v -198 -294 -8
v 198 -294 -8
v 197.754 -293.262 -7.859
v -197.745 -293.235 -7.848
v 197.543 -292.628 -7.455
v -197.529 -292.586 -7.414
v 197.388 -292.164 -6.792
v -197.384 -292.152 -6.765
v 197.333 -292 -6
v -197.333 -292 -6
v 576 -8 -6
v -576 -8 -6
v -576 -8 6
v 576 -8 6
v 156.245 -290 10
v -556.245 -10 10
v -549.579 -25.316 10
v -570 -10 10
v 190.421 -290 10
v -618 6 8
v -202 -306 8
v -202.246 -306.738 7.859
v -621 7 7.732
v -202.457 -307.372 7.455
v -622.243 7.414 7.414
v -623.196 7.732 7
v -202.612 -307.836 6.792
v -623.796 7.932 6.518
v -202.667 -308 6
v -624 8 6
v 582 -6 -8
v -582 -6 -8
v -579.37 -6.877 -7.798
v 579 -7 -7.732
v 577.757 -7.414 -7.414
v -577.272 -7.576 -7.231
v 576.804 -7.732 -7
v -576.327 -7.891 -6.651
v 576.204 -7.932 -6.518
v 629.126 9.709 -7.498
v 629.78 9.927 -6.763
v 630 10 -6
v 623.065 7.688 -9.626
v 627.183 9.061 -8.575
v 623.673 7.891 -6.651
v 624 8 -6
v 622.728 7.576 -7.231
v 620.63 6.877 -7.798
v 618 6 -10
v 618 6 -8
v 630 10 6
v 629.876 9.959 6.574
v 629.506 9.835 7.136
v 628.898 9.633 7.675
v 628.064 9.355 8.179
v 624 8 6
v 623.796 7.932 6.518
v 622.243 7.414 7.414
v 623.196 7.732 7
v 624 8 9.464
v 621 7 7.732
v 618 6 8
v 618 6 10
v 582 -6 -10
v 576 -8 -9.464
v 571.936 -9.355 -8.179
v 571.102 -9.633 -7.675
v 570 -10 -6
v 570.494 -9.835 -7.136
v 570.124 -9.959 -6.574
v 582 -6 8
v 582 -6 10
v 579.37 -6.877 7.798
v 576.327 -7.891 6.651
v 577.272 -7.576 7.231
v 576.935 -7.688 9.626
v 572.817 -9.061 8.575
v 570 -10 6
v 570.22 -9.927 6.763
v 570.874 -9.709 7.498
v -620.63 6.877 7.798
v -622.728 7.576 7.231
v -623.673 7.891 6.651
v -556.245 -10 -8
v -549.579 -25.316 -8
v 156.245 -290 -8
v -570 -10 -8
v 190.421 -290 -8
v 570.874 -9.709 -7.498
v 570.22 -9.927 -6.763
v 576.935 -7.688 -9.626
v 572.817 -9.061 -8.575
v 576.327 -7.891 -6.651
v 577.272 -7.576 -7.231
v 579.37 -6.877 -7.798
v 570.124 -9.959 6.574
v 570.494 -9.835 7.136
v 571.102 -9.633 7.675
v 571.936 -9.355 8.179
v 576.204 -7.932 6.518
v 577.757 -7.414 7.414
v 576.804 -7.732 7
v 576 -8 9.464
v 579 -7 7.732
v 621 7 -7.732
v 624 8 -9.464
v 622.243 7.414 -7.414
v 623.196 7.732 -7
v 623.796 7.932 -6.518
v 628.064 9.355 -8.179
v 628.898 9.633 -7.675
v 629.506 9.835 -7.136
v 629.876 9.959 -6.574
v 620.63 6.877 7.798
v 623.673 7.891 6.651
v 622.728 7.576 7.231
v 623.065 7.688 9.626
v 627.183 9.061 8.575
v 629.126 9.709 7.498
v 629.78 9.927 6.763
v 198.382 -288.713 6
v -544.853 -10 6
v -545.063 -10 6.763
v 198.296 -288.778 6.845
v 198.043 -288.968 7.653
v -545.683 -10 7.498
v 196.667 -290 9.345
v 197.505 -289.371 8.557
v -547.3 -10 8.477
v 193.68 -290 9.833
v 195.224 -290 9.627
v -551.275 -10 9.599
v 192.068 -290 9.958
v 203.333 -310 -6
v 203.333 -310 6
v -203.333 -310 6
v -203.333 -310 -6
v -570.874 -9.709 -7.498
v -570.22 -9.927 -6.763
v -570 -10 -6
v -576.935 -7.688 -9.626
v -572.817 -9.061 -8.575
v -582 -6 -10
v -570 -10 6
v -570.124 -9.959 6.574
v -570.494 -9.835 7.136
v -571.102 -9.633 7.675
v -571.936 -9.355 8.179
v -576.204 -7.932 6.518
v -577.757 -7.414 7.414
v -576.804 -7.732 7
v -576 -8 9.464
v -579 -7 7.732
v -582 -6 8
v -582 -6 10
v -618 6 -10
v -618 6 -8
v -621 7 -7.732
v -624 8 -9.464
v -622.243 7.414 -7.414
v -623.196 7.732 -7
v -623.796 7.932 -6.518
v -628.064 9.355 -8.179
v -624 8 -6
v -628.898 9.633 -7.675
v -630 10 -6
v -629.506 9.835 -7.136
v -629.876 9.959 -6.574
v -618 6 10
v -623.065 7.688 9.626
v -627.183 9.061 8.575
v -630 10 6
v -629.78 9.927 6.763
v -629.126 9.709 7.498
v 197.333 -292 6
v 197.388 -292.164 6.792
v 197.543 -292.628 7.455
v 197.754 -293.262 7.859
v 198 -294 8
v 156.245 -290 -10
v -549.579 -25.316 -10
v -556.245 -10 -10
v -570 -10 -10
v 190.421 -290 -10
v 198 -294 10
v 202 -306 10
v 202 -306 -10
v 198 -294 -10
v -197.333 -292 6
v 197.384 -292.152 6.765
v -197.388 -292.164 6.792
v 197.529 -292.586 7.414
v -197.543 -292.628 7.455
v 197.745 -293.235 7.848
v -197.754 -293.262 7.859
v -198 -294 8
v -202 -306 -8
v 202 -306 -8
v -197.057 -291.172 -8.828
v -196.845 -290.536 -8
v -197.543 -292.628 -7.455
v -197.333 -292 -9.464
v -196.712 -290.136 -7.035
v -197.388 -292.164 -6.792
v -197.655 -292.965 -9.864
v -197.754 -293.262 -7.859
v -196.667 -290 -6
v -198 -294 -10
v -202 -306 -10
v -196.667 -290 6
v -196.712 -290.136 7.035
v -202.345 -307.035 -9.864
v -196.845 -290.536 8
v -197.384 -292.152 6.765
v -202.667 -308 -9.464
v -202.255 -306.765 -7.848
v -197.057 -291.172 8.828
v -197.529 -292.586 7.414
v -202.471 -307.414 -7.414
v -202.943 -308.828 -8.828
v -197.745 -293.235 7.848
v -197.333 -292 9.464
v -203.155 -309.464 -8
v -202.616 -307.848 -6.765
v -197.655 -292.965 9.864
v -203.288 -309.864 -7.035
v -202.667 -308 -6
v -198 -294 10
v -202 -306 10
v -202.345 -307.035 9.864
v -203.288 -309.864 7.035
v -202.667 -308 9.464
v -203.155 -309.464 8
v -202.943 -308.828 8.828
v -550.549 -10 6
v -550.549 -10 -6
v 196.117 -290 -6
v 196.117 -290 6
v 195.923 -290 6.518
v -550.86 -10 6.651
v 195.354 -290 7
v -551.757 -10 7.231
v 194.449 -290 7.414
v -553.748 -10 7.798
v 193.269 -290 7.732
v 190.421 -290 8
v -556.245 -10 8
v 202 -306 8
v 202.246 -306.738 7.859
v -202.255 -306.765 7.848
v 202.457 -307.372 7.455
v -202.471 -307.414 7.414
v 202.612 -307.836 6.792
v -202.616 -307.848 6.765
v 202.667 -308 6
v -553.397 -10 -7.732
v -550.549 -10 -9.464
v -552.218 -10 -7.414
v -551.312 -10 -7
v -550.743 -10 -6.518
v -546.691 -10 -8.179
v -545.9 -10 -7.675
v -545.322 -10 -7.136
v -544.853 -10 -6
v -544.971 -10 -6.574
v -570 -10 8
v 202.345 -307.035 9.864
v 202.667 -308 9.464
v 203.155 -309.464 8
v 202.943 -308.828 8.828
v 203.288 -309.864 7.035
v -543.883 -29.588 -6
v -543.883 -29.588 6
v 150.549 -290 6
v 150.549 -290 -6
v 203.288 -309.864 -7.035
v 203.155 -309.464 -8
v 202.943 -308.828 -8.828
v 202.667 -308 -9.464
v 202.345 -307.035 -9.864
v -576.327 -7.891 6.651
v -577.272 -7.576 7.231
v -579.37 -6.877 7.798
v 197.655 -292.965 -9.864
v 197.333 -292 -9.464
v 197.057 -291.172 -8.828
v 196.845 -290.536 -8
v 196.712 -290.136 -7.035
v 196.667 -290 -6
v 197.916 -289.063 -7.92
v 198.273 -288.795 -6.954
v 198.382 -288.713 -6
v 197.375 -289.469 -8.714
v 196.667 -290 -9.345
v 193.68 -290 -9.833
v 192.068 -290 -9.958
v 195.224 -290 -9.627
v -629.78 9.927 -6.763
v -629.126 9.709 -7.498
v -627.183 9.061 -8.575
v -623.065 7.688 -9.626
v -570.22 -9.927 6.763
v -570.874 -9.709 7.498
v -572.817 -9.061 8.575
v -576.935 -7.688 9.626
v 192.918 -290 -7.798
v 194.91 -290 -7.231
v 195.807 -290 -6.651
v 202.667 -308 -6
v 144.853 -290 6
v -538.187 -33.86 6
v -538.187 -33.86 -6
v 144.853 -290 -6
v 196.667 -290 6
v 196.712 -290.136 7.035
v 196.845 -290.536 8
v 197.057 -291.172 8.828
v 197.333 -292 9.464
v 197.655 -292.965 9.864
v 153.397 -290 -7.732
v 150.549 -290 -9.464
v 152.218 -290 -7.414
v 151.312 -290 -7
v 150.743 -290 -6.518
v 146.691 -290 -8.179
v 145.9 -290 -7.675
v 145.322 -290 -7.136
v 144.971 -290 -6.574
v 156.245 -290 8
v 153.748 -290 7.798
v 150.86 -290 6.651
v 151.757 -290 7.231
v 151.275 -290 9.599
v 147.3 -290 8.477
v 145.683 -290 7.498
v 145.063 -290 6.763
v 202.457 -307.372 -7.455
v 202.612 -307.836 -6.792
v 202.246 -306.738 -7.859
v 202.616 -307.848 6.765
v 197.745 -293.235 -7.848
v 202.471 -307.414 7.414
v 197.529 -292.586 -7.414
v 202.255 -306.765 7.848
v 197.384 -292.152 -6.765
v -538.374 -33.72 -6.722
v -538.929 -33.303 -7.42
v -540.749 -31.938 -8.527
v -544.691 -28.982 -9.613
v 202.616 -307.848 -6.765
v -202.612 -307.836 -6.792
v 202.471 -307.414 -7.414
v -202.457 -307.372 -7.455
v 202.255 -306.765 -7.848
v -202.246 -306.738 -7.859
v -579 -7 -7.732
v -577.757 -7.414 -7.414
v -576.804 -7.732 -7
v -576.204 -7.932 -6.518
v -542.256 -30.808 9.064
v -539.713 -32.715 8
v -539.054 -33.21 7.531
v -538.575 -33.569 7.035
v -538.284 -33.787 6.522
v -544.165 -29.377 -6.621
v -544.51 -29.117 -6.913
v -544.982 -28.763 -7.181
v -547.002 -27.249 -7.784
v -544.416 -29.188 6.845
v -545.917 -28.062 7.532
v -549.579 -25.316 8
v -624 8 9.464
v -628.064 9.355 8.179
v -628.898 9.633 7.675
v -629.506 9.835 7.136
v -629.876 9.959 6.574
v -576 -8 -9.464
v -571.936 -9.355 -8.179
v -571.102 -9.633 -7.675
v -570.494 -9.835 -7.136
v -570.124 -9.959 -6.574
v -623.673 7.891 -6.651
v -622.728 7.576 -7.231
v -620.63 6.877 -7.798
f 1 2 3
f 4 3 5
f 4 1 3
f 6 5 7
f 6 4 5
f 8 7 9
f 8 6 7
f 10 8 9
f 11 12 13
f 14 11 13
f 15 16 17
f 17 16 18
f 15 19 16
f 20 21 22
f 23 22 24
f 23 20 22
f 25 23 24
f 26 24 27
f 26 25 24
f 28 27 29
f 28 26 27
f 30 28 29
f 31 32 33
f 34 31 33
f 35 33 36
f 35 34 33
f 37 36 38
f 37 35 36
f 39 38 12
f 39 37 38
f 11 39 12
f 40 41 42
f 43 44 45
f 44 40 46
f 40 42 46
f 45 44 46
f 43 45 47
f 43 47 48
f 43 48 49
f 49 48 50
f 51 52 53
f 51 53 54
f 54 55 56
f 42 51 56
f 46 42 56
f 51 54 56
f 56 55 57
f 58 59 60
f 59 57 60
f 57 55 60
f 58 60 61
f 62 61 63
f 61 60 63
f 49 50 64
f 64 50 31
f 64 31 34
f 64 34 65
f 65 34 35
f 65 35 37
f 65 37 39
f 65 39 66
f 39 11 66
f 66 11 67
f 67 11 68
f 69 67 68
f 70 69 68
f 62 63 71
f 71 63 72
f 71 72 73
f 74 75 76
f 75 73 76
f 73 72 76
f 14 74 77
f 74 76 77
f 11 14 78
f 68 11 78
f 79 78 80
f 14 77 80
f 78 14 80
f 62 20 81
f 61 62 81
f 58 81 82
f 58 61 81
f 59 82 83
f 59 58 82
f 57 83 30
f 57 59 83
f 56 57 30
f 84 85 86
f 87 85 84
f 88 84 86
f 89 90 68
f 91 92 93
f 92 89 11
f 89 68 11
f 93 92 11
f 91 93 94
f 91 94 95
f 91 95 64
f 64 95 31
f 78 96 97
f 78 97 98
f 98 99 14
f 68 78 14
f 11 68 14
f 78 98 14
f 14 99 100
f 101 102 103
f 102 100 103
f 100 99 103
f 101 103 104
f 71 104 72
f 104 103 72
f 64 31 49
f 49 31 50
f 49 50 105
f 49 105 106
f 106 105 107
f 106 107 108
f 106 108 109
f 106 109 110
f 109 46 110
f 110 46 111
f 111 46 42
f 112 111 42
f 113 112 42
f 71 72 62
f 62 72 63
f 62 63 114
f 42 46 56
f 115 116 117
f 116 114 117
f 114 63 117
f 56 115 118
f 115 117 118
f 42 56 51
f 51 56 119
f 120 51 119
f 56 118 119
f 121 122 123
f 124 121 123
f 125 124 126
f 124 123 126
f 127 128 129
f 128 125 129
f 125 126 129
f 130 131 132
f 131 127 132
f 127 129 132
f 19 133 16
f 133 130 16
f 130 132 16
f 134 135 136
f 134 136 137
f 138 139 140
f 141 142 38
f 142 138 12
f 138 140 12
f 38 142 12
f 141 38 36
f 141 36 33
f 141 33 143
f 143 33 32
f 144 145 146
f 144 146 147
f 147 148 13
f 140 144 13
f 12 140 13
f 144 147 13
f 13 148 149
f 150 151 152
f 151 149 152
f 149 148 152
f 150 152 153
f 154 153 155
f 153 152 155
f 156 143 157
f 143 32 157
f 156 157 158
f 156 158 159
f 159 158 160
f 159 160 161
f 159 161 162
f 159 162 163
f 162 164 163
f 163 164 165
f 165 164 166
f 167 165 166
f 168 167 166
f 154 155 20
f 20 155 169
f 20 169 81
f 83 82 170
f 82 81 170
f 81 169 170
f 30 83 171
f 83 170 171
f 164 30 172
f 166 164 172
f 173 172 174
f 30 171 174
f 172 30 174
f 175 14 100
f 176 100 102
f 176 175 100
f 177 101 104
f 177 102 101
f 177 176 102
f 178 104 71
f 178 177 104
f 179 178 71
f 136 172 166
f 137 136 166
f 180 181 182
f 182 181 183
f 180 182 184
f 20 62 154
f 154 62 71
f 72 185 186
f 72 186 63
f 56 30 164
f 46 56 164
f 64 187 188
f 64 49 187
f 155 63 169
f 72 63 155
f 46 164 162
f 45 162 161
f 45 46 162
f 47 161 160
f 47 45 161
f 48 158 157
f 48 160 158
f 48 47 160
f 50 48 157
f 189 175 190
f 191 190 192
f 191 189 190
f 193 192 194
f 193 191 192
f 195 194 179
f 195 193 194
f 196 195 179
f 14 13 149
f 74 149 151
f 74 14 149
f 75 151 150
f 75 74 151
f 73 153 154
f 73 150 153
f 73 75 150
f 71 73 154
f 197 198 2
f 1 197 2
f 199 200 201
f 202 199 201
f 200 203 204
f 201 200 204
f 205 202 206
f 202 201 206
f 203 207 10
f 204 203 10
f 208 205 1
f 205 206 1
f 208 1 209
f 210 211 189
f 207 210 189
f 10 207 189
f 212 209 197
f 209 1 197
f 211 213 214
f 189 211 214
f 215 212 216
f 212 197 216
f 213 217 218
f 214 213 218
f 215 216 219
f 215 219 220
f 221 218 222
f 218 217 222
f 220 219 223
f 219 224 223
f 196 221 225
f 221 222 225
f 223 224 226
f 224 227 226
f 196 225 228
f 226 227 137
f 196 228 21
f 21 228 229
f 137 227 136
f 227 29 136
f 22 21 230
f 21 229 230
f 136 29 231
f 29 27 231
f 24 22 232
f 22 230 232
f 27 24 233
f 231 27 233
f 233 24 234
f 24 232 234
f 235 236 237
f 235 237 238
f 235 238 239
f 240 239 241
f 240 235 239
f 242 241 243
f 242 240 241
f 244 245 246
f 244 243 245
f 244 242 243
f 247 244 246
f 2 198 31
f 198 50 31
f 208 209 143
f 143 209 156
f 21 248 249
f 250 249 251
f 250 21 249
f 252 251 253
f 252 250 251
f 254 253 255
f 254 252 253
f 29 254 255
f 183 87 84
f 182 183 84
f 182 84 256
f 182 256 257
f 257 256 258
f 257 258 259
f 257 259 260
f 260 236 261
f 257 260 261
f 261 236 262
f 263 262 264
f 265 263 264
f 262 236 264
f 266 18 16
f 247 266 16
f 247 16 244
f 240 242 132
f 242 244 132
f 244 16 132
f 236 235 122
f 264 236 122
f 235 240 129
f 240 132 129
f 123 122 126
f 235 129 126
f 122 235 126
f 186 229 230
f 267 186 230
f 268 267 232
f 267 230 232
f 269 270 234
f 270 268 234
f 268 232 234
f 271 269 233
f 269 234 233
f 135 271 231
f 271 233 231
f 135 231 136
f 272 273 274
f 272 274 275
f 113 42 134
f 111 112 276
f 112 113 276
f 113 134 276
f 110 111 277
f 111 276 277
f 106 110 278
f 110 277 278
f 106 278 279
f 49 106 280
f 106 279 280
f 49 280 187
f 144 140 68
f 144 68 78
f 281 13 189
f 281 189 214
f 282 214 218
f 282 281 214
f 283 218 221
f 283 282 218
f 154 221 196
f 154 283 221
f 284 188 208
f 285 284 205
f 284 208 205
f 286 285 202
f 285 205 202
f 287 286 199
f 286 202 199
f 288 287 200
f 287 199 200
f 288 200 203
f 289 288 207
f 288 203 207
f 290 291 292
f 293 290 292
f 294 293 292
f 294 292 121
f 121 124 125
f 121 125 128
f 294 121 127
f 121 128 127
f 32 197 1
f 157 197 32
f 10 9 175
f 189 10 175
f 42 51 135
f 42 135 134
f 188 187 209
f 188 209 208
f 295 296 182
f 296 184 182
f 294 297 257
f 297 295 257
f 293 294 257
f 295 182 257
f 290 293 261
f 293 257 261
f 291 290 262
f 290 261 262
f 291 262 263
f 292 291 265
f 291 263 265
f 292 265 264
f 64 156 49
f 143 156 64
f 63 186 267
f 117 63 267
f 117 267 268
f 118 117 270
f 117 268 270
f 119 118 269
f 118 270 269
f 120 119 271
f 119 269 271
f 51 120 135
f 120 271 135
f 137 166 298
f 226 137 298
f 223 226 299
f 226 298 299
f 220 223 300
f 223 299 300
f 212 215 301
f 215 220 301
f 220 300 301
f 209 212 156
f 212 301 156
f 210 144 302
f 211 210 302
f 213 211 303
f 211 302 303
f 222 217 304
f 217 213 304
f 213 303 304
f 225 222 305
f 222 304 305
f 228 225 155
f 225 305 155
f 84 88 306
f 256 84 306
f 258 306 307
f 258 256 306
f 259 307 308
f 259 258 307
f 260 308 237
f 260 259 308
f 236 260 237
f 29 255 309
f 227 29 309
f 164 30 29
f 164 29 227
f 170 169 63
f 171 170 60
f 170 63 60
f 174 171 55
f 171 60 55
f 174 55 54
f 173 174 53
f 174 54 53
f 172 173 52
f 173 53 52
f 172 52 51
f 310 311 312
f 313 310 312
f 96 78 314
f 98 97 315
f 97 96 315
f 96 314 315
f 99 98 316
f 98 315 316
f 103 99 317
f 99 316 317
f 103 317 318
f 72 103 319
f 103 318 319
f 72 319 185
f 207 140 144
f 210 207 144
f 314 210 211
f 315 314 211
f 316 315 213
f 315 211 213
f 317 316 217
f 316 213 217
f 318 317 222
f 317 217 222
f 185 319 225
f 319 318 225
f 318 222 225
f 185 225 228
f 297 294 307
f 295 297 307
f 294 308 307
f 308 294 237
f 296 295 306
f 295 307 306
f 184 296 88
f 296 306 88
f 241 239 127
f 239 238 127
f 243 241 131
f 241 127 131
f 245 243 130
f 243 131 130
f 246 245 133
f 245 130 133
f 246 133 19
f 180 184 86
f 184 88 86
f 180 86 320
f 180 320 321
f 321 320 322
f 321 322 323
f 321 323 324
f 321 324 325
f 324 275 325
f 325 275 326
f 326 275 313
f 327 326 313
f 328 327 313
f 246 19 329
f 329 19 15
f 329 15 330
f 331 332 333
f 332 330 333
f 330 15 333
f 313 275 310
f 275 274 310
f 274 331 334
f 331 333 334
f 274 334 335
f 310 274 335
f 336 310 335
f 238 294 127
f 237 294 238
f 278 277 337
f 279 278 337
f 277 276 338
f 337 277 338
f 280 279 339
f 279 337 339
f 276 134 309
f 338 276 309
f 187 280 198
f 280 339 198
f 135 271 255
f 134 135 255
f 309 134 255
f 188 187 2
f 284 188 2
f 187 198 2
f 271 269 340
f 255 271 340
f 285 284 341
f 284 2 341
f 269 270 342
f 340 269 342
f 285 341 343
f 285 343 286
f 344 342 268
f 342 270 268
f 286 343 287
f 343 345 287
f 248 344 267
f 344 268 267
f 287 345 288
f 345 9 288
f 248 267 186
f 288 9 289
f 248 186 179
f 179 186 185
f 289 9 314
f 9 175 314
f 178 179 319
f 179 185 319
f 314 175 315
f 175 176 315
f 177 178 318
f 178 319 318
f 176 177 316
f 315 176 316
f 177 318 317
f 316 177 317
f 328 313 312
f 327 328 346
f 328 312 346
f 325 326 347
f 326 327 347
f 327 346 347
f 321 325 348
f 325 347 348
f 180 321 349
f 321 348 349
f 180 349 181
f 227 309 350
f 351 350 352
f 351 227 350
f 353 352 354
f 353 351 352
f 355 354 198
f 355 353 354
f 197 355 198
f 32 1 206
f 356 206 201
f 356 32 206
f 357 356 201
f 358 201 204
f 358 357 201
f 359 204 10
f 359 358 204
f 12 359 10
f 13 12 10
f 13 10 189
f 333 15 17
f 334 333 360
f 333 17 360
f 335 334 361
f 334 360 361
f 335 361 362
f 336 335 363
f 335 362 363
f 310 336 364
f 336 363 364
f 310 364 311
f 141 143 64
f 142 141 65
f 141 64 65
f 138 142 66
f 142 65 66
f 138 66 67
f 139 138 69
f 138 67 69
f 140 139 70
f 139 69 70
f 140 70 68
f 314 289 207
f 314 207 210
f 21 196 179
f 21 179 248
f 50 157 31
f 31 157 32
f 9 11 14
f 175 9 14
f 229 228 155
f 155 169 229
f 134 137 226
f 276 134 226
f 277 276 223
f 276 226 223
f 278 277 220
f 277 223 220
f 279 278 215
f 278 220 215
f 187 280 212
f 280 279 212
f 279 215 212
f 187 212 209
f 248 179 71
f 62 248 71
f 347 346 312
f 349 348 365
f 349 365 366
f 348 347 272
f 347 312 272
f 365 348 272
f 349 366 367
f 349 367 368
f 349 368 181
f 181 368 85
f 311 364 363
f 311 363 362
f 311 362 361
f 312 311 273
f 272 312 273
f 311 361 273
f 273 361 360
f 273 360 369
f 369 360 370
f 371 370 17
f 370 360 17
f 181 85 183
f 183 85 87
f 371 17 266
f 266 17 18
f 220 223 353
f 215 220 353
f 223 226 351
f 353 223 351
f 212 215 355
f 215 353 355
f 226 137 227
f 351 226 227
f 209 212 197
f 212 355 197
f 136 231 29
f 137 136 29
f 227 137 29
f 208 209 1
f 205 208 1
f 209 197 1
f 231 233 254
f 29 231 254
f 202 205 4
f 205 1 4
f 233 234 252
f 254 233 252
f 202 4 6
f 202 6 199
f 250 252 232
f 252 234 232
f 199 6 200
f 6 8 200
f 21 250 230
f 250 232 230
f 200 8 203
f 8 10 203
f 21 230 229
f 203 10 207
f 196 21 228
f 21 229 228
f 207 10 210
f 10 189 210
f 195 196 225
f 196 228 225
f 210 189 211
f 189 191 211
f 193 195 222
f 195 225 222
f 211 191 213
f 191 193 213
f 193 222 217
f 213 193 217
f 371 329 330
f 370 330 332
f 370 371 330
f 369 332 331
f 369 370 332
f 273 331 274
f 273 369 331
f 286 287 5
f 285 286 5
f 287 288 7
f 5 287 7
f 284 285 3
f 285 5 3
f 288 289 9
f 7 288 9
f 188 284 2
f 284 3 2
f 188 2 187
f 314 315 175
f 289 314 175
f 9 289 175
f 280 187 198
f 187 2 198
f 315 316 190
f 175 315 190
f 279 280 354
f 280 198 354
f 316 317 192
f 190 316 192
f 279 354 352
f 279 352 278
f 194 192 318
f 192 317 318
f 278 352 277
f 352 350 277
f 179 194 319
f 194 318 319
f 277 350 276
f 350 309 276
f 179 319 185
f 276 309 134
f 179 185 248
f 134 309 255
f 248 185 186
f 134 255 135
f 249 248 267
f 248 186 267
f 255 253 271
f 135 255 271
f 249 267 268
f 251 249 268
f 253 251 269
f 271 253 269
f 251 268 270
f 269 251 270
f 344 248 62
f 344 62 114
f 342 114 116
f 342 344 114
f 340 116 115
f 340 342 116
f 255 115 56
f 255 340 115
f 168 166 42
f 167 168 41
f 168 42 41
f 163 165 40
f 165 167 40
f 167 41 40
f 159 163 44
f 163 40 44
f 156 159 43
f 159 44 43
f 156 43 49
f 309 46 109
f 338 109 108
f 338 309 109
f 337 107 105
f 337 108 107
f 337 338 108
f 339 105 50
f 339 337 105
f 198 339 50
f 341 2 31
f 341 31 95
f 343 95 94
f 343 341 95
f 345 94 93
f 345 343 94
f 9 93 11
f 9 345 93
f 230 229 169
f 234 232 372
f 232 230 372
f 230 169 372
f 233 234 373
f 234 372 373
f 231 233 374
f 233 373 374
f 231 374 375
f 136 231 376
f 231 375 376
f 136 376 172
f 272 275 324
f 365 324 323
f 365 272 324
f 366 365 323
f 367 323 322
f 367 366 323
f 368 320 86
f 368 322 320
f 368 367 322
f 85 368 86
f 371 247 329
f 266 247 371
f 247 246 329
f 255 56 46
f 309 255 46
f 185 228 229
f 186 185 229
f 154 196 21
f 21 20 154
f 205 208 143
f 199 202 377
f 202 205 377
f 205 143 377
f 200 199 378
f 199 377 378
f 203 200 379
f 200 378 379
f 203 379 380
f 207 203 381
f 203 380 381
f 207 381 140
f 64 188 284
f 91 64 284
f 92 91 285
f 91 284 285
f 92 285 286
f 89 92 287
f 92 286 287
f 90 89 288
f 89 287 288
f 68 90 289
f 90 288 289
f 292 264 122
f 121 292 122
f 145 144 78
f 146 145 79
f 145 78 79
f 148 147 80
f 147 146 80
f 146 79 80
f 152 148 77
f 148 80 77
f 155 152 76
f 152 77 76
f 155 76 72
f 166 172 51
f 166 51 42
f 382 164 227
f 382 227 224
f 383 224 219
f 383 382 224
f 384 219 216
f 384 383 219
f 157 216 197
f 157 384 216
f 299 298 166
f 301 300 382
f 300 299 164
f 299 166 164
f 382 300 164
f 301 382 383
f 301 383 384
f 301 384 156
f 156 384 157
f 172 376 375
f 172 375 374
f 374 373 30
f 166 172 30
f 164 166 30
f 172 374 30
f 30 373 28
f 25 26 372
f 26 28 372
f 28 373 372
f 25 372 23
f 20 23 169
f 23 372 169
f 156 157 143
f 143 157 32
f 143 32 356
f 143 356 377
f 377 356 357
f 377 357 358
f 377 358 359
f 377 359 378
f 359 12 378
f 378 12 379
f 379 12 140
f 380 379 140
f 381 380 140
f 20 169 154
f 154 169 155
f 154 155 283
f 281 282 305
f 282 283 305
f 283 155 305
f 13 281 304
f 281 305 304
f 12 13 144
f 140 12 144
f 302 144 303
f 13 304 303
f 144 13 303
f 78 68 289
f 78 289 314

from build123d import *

# Parameters (mm, degrees)
SQUARE_TUBE_20_X_20_X_2_2_DEPTH      = 1243.426406871
SQUARE_TUBE_20_X_20_X_2_2_DEPTH_BACK = 43.426406871
SQUARE_TUBE_20_X_20_X_2_2_2_DEPTH    = 549.140452079
SQUARE_TUBE_20_X_20_X_2_2_3_DEPTH    = 411.428090416
SQUARE_TUBE_20_X_20_X_2_2_4_DEPTH    = 549.140452079
SQUARE_TUBE_20_X_20_X_2_1_DEPTH      = 854.400374532


with BuildPart() as part:
    # Sketch15 → Square tube 20 X 20 X 2(2) (new, two sides: drawn at the far end of the back side and taken through both)
    with BuildSketch(Plane(origin=(600, 0, 0), x_dir=(0, -1, 0), z_dir=(-1, 0, 0)).offset(-SQUARE_TUBE_20_X_20_X_2_2_DEPTH_BACK)):
        with BuildLine():
            Line((-6, -10), (6, -10))
            ThreePointArc((6, -10), (8.828427125, -8.828427125), (10, -6))
            Line((10, -6), (10, 6))
            ThreePointArc((10, 6), (8.828427125, 8.828427125), (6, 10))
            Line((6, 10), (-6, 10))
            ThreePointArc((-6, 10), (-8.828427125, 8.828427125), (-10, 6))
            Line((-10, 6), (-10, -6))
            ThreePointArc((-10, -6), (-8.828427125, -8.828427125), (-6, -10))
        make_face()
        with BuildLine():
            Line((-6, -8), (6, -8))
            ThreePointArc((6, -8), (7.414213562, -7.414213562), (8, -6))
            Line((8, -6), (8, 6))
            ThreePointArc((8, 6), (7.414213562, 7.414213562), (6, 8))
            Line((6, 8), (-6, 8))
            ThreePointArc((-6, 8), (-7.414213562, 7.414213562), (-8, 6))
            Line((-8, 6), (-8, -6))
            ThreePointArc((-8, -6), (-7.414213562, -7.414213562), (-6, -8))
        make_face(mode=Mode.SUBTRACT)
    extrude(amount=SQUARE_TUBE_20_X_20_X_2_2_DEPTH + SQUARE_TUBE_20_X_20_X_2_2_DEPTH_BACK)

    # Square tube 20 X 20 X 2(2) mitre 1
    split(bisect_by=Plane(origin=(600, 0, 0), x_dir=(-0.948683298, -0.316227766, 0), z_dir=(-0.316227766, 0.948683298, 0)), keep=Keep.TOP)

    # Square tube 20 X 20 X 2(2) mitre 2
    split(bisect_by=Plane(origin=(-600, 0, 0), x_dir=(-0.948683298, 0.316227766, 0), z_dir=(0.316227766, 0.948683298, 0)), keep=Keep.TOP)


with BuildPart() as body_2:
    # Sketch15 on segment 2 (carried to segment 2) → Square tube 20 X 20 X 2_2 2 (new body)
    with BuildSketch(Plane(origin=(-634.741125497, 26.055844123, 0), x_dir=(0.6, 0.8, 0), z_dir=(0.8, -0.6, 0))):
        with BuildLine():
            Line((-6, -10), (6, -10))
            ThreePointArc((6, -10), (8.828427125, -8.828427125), (10, -6))
            Line((10, -6), (10, 6))
            ThreePointArc((10, 6), (8.828427125, 8.828427125), (6, 10))
            Line((6, 10), (-6, 10))
            ThreePointArc((-6, 10), (-8.828427125, 8.828427125), (-10, 6))
            Line((-10, 6), (-10, -6))
            ThreePointArc((-10, -6), (-8.828427125, -8.828427125), (-6, -10))
        make_face()
        with BuildLine():
            Line((-6, -8), (6, -8))
            ThreePointArc((6, -8), (7.414213562, -7.414213562), (8, -6))
            Line((8, -6), (8, 6))
            ThreePointArc((8, 6), (7.414213562, 7.414213562), (6, 8))
            Line((6, 8), (-6, 8))
            ThreePointArc((-6, 8), (-7.414213562, 7.414213562), (-8, 6))
            Line((-8, 6), (-8, -6))
            ThreePointArc((-8, -6), (-7.414213562, -7.414213562), (-6, -8))
        make_face(mode=Mode.SUBTRACT)
    extrude(amount=SQUARE_TUBE_20_X_20_X_2_2_2_DEPTH)

    # Square tube 20 X 20 X 2_2 2 mitre 1
    split(bisect_by=Plane(origin=(-600, 0, 0), x_dir=(0.948683298, -0.316227766, 0), z_dir=(-0.316227766, -0.948683298, 0)), keep=Keep.TOP)

    # Square tube 20 X 20 X 2_2 2 mitre 2
    split(bisect_by=Plane(origin=(-200, -300, 0), x_dir=(-0.316227766, -0.948683298, 0), z_dir=(-0.948683298, 0.316227766, 0)), keep=Keep.TOP)


with BuildPart() as body_3:
    # Sketch15 on segment 3 (carried to segment 3) → Square tube 20 X 20 X 2_2 3 (new body)
    with BuildSketch(Plane(origin=(-205.714045208, -300, 0), x_dir=(0, 1, 0), z_dir=(1, 0, 0))):
        with BuildLine():
            Line((-6, -10), (6, -10))
            ThreePointArc((6, -10), (8.828427125, -8.828427125), (10, -6))
            Line((10, -6), (10, 6))
            ThreePointArc((10, 6), (8.828427125, 8.828427125), (6, 10))
            Line((6, 10), (-6, 10))
            ThreePointArc((-6, 10), (-8.828427125, 8.828427125), (-10, 6))
            Line((-10, 6), (-10, -6))
            ThreePointArc((-10, -6), (-8.828427125, -8.828427125), (-6, -10))
        make_face()
        with BuildLine():
            Line((-6, -8), (6, -8))
            ThreePointArc((6, -8), (7.414213562, -7.414213562), (8, -6))
            Line((8, -6), (8, 6))
            ThreePointArc((8, 6), (7.414213562, 7.414213562), (6, 8))
            Line((6, 8), (-6, 8))
            ThreePointArc((-6, 8), (-7.414213562, 7.414213562), (-8, 6))
            Line((-8, 6), (-8, -6))
            ThreePointArc((-8, -6), (-7.414213562, -7.414213562), (-6, -8))
        make_face(mode=Mode.SUBTRACT)
    extrude(amount=SQUARE_TUBE_20_X_20_X_2_2_3_DEPTH)

    # Square tube 20 X 20 X 2_2 3 mitre 1
    split(bisect_by=Plane(origin=(-200, -300, 0), x_dir=(0.316227766, 0.948683298, 0), z_dir=(0.948683298, -0.316227766, 0)), keep=Keep.TOP)

    # Square tube 20 X 20 X 2_2 3 mitre 2
    split(bisect_by=Plane(origin=(200, -300, 0), x_dir=(0.316227766, -0.948683298, 0), z_dir=(-0.948683298, -0.316227766, 0)), keep=Keep.TOP)


with BuildPart() as body_4:
    # Sketch15 on segment 4 (carried to segment 4) → Square tube 20 X 20 X 2_2 4 (new body)
    with BuildSketch(Plane(origin=(195.428763834, -303.428427125, 0), x_dir=(-0.6, 0.8, 0), z_dir=(0.8, 0.6, 0))):
        with BuildLine():
            Line((-6, -10), (6, -10))
            ThreePointArc((6, -10), (8.828427125, -8.828427125), (10, -6))
            Line((10, -6), (10, 6))
            ThreePointArc((10, 6), (8.828427125, 8.828427125), (6, 10))
            Line((6, 10), (-6, 10))
            ThreePointArc((-6, 10), (-8.828427125, 8.828427125), (-10, 6))
            Line((-10, 6), (-10, -6))
            ThreePointArc((-10, -6), (-8.828427125, -8.828427125), (-6, -10))
        make_face()
        with BuildLine():
            Line((-6, -8), (6, -8))
            ThreePointArc((6, -8), (7.414213562, -7.414213562), (8, -6))
            Line((8, -6), (8, 6))
            ThreePointArc((8, 6), (7.414213562, 7.414213562), (6, 8))
            Line((6, 8), (-6, 8))
            ThreePointArc((-6, 8), (-7.414213562, 7.414213562), (-8, 6))
            Line((-8, 6), (-8, -6))
            ThreePointArc((-8, -6), (-7.414213562, -7.414213562), (-6, -8))
        make_face(mode=Mode.SUBTRACT)
    extrude(amount=SQUARE_TUBE_20_X_20_X_2_2_4_DEPTH)

    # Square tube 20 X 20 X 2_2 4 mitre 1
    split(bisect_by=Plane(origin=(200, -300, 0), x_dir=(-0.316227766, 0.948683298, 0), z_dir=(0.948683298, 0.316227766, 0)), keep=Keep.TOP)

    # Square tube 20 X 20 X 2_2 4 mitre 2
    split(bisect_by=Plane(origin=(600, 0, 0), x_dir=(0.948683298, 0.316227766, 0), z_dir=(0.316227766, -0.948683298, 0)), keep=Keep.TOP)


with BuildPart() as body_5:
    # Sketch16 → Square tube 20 X 20 X 2(1) (new body)
    with BuildSketch(Plane(origin=(-600, 0, 0), x_dir=(0.35112344158839154, 0.9363291775690447, 0), z_dir=(0.9363291775690447, -0.35112344158839154, 0))):
        with BuildLine():
            Line((-6, -10), (6, -10))
            ThreePointArc((6, -10), (8.828427125, -8.828427125), (10, -6))
            Line((10, -6), (10, 6))
            ThreePointArc((10, 6), (8.828427125, 8.828427125), (6, 10))
            Line((6, 10), (-6, 10))
            ThreePointArc((-6, 10), (-8.828427125, 8.828427125), (-10, 6))
            Line((-10, 6), (-10, -6))
            ThreePointArc((-10, -6), (-8.828427125, -8.828427125), (-6, -10))
        make_face()
        with BuildLine():
            Line((-6, -8), (6, -8))
            ThreePointArc((6, -8), (7.414213562, -7.414213562), (8, -6))
            Line((8, -6), (8, 6))
            ThreePointArc((8, 6), (7.414213562, 7.414213562), (6, 8))
            Line((6, 8), (-6, 8))
            ThreePointArc((-6, 8), (-7.414213562, 7.414213562), (-8, 6))
            Line((-8, 6), (-8, -6))
            ThreePointArc((-8, -6), (-7.414213562, -7.414213562), (-6, -8))
        make_face(mode=Mode.SUBTRACT)
    extrude(amount=SQUARE_TUBE_20_X_20_X_2_1_DEPTH)

    # Trim/Extend1
    split(bisect_by=Plane.XZ.offset(10), keep=Keep.TOP)

    # Trim_Extend1 3
    split(bisect_by=Plane(origin=(-383.333333333, -150, 0), x_dir=(-0.8, 0.6, 0), z_dir=(0.6, 0.8, 0)), keep=Keep.TOP)

    # Trim_Extend1 5
    split(bisect_by=Plane(origin=(383.333333334, -150, 0), x_dir=(-0.8, -0.6, 0), z_dir=(-0.6, 0.8, 0)), keep=Keep.TOP)

    # Trim_Extend1 7
    split(bisect_by=Plane(origin=(0, -290, 0), x_dir=(-1, 0, 0), z_dir=(0, 1, 0)), keep=Keep.TOP)


solid = Compound([part.part, body_2.part, body_3.part, body_4.part, body_5.part])
